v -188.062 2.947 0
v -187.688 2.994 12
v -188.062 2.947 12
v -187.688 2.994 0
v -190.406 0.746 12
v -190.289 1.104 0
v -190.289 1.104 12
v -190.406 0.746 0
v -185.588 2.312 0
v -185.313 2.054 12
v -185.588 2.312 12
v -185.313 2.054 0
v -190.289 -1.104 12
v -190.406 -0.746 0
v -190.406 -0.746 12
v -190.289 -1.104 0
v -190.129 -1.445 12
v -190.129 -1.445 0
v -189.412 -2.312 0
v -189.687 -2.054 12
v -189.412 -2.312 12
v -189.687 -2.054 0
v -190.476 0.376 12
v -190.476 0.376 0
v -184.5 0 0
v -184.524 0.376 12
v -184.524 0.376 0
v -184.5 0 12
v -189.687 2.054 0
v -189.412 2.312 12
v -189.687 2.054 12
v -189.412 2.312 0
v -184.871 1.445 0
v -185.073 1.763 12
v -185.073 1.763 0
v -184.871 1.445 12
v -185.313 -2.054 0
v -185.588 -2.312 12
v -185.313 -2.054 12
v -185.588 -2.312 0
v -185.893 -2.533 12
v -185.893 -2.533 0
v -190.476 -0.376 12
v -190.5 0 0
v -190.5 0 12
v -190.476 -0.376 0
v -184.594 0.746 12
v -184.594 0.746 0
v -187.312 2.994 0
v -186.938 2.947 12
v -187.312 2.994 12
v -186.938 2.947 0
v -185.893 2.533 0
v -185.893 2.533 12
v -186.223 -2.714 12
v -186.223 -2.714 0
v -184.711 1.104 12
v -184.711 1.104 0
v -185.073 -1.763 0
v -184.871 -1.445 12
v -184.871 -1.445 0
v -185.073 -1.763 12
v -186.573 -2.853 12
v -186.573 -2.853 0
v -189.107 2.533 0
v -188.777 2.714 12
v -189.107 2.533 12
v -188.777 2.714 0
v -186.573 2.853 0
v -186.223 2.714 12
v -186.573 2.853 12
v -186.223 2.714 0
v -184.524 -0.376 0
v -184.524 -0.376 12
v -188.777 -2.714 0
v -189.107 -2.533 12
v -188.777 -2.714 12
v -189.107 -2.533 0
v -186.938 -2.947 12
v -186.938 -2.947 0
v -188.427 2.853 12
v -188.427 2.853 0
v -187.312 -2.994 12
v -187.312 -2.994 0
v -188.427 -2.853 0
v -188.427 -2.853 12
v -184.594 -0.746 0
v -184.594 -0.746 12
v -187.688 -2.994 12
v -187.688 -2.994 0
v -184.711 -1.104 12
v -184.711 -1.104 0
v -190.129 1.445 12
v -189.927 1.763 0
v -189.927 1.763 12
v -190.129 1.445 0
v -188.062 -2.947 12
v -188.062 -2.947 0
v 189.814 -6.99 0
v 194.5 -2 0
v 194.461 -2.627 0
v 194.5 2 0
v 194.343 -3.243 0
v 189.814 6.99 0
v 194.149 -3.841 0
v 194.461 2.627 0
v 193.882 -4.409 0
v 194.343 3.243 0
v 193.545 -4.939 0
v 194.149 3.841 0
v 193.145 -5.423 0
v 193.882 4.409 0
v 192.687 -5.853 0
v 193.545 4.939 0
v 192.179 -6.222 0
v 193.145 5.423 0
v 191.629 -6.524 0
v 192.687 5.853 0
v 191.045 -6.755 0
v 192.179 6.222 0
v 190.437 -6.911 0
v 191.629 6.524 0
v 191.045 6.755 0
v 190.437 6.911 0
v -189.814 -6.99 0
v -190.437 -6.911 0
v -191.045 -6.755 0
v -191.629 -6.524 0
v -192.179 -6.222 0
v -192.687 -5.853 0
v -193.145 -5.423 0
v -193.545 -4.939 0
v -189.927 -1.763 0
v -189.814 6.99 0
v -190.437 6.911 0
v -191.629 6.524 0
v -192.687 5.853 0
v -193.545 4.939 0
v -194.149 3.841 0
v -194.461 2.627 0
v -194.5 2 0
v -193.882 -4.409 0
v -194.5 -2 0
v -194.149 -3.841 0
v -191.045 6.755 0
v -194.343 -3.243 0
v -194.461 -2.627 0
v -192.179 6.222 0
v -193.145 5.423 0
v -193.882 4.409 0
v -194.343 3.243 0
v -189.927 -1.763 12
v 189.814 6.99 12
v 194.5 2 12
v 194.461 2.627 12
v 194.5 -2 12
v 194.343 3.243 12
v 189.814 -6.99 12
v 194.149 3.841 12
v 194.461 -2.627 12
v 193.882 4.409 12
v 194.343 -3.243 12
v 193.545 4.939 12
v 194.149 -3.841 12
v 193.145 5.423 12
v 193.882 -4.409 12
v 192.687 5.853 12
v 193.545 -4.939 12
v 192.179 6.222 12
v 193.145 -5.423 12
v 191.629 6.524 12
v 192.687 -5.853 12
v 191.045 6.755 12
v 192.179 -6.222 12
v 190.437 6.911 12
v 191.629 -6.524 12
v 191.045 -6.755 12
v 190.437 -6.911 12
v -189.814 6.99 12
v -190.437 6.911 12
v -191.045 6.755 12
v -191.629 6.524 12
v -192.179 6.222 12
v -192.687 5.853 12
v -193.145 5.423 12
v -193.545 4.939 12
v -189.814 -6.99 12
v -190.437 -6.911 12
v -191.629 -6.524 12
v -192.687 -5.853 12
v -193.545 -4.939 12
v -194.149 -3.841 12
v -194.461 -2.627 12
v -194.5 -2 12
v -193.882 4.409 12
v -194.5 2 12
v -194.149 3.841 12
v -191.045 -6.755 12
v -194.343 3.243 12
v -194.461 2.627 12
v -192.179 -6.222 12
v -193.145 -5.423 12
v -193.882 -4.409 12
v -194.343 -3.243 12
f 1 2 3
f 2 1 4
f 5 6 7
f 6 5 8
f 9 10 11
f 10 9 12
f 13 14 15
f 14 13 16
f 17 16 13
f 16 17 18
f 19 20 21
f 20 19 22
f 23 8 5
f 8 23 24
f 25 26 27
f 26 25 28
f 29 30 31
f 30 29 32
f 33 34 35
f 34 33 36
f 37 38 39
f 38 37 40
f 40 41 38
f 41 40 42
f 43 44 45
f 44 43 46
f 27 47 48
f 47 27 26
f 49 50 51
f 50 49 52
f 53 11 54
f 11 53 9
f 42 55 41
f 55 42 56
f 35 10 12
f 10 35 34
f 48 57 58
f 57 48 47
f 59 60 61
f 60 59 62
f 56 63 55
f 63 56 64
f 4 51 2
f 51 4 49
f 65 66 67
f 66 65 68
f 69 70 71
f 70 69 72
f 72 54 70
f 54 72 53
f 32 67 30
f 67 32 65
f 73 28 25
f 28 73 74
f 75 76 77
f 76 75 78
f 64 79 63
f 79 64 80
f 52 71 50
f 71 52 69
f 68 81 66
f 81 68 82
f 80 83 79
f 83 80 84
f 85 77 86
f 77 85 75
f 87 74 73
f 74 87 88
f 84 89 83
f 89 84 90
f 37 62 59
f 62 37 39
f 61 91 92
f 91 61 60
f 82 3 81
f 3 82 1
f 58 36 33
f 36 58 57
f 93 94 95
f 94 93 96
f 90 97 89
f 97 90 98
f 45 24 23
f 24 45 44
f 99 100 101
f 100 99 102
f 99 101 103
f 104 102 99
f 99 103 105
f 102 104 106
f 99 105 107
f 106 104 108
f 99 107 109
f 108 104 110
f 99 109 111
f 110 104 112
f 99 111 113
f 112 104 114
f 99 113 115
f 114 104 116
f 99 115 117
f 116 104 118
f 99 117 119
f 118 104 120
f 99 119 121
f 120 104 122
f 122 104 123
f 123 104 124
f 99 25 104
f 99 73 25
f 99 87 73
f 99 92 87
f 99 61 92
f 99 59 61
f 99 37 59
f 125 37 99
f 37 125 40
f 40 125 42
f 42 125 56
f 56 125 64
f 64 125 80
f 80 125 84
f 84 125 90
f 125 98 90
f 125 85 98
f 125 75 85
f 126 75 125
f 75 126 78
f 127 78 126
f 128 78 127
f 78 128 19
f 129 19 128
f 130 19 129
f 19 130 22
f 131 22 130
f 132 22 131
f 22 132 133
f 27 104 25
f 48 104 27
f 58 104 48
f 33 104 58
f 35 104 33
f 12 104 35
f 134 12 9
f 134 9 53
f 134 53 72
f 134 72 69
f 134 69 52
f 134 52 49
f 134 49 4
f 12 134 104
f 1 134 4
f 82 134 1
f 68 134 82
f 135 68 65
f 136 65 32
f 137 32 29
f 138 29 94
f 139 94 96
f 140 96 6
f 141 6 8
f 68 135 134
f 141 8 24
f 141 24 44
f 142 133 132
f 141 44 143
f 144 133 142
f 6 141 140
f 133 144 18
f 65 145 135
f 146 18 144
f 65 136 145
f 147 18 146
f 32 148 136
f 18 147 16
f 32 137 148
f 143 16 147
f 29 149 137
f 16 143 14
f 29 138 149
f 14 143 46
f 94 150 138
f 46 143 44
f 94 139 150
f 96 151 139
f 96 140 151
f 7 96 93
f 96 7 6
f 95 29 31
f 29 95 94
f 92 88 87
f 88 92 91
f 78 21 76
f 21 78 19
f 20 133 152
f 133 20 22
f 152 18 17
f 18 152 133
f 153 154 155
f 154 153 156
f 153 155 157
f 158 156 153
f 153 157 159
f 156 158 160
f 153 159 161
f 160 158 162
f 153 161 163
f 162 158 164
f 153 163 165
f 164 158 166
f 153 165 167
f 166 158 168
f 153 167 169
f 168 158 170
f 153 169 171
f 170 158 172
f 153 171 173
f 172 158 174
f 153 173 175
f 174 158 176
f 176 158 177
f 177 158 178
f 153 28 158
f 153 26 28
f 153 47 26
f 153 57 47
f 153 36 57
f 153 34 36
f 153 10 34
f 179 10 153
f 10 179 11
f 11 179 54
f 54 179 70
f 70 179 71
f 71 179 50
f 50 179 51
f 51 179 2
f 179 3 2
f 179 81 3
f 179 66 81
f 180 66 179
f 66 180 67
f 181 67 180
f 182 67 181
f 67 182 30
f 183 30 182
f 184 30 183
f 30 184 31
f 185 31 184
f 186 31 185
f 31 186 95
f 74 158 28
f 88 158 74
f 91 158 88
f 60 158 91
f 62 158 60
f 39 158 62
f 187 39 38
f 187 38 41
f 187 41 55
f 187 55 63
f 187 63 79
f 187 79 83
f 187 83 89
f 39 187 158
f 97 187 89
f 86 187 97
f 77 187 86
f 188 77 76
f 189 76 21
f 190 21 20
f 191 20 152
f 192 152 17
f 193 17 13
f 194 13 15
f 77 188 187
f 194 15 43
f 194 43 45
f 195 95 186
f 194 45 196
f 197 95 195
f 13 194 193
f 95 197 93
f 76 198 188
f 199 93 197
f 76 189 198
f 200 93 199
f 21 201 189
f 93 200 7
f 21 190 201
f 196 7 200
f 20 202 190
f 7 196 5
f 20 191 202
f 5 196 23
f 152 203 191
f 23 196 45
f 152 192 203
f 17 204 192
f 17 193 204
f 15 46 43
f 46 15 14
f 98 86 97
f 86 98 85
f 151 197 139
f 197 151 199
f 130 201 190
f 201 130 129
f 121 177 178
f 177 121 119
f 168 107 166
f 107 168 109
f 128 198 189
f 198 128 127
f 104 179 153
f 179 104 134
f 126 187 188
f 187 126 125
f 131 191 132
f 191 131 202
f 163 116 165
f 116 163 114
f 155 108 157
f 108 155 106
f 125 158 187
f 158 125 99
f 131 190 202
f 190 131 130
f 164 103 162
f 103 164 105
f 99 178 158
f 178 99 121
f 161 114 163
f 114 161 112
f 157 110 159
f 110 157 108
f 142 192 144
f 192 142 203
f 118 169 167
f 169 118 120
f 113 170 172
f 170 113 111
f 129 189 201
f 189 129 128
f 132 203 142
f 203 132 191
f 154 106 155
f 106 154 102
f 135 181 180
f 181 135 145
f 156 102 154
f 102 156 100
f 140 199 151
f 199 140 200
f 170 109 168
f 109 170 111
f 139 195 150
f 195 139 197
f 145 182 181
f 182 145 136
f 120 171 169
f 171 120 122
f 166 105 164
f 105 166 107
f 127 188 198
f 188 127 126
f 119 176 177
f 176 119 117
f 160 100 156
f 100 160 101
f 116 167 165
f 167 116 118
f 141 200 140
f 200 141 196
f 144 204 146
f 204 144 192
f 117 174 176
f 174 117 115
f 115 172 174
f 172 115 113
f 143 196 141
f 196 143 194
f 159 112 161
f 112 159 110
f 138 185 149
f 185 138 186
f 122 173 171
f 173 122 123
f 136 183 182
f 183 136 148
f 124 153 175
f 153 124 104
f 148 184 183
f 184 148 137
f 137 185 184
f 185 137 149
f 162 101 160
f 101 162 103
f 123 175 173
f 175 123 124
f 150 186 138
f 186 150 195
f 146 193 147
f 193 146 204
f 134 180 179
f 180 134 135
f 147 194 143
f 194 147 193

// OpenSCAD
$fn = 50;


difference() {
	union() {
		hull() {
			translate(v = [-189.5000000000, 2.0000000000, 0]) {
				cylinder(h = 12, r = 5);
			}
			translate(v = [189.5000000000, 2.0000000000, 0]) {
				cylinder(h = 12, r = 5);
			}
			translate(v = [-189.5000000000, -2.0000000000, 0]) {
				cylinder(h = 12, r = 5);
			}
			translate(v = [189.5000000000, -2.0000000000, 0]) {
				cylinder(h = 12, r = 5);
			}
		}
	}
	union() {
		translate(v = [-187.5000000000, 0.0000000000, 0]) {
			cylinder(h = 12, r = 3.0000000000);
		}
		translate(v = [-187.5000000000, 0.0000000000, 0]) {
			cylinder(h = 12, r = 1.5000000000);
		}
		translate(v = [-187.5000000000, 0.0000000000, 0]) {
			cylinder(h = 12, r = 1.5000000000);
		}
		translate(v = [-187.5000000000, 0.0000000000, 0]) {
			cylinder(h = 12, r = 1.5000000000);
		}
	}
}
